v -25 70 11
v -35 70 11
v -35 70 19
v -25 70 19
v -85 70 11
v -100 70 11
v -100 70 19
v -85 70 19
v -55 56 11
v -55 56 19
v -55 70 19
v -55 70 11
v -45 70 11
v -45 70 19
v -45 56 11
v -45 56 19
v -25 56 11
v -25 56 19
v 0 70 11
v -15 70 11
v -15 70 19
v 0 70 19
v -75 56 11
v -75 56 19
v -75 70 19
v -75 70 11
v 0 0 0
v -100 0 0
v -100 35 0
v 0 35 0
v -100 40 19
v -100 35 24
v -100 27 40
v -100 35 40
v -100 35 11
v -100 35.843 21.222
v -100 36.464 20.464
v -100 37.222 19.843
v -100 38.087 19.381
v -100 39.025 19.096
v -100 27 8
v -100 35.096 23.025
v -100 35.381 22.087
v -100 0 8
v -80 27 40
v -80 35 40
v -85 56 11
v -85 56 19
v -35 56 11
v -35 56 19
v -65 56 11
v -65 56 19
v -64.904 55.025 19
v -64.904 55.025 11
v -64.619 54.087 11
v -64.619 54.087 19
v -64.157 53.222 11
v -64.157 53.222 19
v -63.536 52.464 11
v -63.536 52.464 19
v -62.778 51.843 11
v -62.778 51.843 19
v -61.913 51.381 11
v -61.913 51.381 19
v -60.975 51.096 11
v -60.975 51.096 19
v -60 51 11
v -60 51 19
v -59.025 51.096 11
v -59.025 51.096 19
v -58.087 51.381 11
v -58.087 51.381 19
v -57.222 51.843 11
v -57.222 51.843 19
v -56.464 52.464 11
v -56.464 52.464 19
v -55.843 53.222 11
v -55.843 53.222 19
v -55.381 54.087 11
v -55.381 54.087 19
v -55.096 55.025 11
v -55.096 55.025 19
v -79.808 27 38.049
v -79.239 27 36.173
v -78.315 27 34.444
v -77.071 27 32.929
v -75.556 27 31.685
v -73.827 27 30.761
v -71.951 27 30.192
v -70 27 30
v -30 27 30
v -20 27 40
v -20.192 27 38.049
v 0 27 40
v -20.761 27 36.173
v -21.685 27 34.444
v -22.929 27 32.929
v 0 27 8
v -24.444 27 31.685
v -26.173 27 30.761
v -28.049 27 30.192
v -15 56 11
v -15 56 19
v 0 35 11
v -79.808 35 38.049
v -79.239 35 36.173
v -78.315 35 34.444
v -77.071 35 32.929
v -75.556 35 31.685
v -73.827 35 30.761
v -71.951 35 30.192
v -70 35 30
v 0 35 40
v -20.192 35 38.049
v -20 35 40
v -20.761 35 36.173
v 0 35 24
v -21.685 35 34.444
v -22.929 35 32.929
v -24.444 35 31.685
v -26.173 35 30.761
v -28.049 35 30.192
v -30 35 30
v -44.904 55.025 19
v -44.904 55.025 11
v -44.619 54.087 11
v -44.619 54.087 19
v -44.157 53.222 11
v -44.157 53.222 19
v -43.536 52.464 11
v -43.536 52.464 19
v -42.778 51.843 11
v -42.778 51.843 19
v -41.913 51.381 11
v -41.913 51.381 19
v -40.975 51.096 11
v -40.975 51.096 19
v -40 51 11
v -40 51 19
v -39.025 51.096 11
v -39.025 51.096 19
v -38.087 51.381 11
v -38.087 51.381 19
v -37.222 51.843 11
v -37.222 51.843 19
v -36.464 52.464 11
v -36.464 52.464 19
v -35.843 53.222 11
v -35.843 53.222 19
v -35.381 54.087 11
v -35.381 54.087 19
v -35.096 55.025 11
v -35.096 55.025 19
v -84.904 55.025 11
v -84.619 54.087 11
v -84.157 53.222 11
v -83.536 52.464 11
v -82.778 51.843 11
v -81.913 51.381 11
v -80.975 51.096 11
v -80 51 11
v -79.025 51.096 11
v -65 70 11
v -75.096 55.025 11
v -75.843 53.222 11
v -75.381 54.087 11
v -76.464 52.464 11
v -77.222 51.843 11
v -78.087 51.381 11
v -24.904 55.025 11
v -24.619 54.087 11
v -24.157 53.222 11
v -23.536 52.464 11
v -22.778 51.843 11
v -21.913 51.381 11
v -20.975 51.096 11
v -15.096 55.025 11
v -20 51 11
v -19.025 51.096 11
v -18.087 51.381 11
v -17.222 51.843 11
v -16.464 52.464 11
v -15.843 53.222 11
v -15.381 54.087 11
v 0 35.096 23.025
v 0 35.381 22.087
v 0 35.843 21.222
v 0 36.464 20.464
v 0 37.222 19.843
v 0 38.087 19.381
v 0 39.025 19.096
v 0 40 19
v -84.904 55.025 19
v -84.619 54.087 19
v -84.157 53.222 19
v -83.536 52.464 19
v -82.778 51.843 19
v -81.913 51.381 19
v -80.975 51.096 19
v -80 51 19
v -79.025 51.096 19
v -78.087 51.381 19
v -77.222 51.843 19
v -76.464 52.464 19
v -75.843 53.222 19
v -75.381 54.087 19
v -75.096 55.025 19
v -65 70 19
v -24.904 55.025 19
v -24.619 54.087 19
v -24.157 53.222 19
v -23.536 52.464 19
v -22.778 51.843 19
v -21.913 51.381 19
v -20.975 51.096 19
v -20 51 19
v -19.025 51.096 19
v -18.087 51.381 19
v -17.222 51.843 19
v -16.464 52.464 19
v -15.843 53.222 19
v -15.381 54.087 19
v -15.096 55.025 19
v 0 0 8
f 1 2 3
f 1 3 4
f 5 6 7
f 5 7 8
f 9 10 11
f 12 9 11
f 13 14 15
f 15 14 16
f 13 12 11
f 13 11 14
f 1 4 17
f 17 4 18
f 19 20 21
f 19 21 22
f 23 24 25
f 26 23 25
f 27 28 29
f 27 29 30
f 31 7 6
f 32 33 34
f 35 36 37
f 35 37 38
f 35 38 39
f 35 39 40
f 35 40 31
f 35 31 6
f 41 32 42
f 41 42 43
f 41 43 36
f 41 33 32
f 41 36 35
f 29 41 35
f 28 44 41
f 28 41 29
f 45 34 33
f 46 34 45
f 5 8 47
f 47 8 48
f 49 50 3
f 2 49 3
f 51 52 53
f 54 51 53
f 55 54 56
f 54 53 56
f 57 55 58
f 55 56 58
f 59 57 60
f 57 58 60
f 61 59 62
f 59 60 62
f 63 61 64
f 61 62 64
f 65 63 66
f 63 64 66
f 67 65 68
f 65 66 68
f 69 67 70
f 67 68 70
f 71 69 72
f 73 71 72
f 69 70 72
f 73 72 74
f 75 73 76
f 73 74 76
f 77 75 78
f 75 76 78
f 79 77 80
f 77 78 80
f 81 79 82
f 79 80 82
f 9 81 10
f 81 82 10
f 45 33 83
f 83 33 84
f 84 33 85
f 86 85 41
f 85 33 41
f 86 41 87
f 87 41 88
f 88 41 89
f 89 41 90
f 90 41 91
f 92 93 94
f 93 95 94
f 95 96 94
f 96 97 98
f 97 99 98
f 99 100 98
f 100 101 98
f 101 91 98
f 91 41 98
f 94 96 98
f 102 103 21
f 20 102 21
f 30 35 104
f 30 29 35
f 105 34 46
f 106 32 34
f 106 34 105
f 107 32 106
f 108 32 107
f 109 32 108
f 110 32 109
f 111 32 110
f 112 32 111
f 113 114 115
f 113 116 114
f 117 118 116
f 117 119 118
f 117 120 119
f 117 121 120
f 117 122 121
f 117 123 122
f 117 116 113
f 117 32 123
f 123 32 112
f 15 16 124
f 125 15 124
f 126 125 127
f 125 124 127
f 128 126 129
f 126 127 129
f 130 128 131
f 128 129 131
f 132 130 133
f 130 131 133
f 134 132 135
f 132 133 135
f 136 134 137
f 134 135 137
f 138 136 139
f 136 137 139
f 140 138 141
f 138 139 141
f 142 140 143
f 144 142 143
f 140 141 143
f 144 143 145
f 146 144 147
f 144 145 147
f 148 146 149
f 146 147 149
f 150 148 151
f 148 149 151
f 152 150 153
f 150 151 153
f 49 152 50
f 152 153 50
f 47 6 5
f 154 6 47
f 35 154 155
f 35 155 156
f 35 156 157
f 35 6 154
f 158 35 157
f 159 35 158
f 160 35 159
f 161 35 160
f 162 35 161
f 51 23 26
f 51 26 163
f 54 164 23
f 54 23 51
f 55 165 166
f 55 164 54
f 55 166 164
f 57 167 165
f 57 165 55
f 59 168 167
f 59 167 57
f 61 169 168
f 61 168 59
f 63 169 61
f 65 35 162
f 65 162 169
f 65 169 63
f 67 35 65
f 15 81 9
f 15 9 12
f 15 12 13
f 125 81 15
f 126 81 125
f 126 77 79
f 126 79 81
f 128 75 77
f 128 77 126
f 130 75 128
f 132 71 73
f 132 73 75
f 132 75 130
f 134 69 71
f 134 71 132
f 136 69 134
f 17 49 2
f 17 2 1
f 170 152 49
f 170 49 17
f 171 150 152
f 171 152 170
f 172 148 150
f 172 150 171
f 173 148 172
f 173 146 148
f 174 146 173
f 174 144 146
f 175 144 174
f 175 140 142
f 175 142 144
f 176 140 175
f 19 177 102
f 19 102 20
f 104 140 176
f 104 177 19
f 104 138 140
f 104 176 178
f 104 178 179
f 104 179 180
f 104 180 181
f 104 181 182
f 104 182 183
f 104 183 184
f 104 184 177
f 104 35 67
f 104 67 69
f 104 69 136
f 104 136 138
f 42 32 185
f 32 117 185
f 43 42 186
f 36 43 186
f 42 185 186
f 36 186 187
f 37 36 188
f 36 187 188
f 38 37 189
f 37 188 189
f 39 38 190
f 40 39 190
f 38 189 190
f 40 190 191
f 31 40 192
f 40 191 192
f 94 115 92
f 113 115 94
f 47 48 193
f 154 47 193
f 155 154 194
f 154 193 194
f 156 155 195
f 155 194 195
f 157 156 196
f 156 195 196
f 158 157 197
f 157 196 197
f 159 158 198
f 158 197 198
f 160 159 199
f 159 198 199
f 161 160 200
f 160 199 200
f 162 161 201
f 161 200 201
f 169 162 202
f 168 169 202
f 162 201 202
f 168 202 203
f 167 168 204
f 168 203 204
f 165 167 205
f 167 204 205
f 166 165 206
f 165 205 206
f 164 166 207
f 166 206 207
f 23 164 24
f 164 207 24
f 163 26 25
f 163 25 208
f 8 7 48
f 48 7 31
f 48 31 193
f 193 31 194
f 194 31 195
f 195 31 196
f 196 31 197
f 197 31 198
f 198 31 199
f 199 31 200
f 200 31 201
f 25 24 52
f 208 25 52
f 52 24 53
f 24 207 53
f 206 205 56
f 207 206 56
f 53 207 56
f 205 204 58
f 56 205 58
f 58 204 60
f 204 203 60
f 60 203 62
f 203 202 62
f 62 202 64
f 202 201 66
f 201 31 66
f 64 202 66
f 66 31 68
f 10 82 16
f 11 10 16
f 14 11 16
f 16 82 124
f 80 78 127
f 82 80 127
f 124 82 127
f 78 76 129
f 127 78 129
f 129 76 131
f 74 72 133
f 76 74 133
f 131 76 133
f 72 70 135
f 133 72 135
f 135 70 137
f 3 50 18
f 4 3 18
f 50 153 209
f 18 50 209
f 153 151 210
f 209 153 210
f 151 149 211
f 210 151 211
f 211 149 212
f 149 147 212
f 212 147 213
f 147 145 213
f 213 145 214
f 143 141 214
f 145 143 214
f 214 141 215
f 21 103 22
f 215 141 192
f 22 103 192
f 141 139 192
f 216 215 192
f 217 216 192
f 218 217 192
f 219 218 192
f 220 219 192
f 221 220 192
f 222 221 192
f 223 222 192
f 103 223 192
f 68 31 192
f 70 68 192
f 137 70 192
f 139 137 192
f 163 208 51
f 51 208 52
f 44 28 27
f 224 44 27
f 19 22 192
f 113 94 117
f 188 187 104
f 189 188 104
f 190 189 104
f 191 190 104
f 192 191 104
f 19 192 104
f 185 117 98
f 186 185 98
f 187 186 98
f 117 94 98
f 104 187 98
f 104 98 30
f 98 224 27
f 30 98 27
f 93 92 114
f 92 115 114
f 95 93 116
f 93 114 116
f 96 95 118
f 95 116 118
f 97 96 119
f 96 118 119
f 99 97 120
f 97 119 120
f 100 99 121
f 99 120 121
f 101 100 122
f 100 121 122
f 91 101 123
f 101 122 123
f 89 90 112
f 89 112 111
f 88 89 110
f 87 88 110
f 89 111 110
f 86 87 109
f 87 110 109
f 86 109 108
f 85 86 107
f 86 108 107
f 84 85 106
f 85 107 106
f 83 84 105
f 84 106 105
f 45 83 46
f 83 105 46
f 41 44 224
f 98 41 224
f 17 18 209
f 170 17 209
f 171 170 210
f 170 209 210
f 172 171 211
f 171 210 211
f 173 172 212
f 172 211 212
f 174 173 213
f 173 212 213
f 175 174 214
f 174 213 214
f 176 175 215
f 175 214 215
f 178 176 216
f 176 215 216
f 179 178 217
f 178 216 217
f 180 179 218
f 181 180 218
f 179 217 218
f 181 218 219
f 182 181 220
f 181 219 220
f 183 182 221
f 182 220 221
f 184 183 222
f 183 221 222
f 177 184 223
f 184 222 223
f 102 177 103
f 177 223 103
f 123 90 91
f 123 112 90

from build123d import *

# Parameters (mm, degrees)
SKETCH1_W           = 100
SKETCH1_H           = 8
BOSS_EXTRUDE1_DEPTH = 35
SKETCH2_W           = 100
SKETCH2_H           = 8
BOSS_EXTRUDE2_DEPTH = 40
SKETCH6_W           = 60
SKETCH6_H           = 8
CUT_EXTRUDE2_DEPTH  = 10
FILLET1_R           = 10
SKETCH8_W           = 100
SKETCH8_H           = 8
BOSS_EXTRUDE3_DEPTH = 35
CUT_EXTRUDE3_DEPTH  = 8
FILLET2_R           = 5


with BuildPart() as part:
    # Sketch1 → Boss-Extrude1 (new body)
    with BuildSketch(Plane(origin=(0, 0, 0), x_dir=(1, 0, 0), z_dir=(0, 1, 0))):
        with Locations((-50, -4)):
            Rectangle(SKETCH1_W, SKETCH1_H)
    extrude(amount=BOSS_EXTRUDE1_DEPTH)

    # Sketch2 → Boss-Extrude2 (add)
    with BuildSketch(Plane.XY):
        with Locations((-50, 31)):
            Rectangle(SKETCH2_W, SKETCH2_H)
    extrude(amount=BOSS_EXTRUDE2_DEPTH)

    # Sketch6 → Cut-Extrude2 (cut)
    with BuildSketch(Plane.XY.offset(40)):
        with Locations((-50, 31)):
            Rectangle(SKETCH6_W, SKETCH6_H)
    extrude(amount=-CUT_EXTRUDE2_DEPTH, mode=Mode.SUBTRACT)

    # Fillet1
    fillet1_edges = [part.edges().sort_by_distance(p)[0] for p in [
        (-20, 31, 30),
        (-80, 31, 30),
    ]]
    fillet(fillet1_edges, radius=FILLET1_R - 0.0001)  # a hair under: the kernel refuses the full size

    # Sketch8 → Boss-Extrude3 (add)
    with BuildSketch(Plane(origin=(0, 35, 0), x_dir=(1, 0, 0), z_dir=(0, 1, 0))):
        with Locations((-50, -15)):
            Rectangle(SKETCH8_W, SKETCH8_H)
    extrude(amount=BOSS_EXTRUDE3_DEPTH)

    # Sketch9 → Cut-Extrude3 (cut)
    with BuildSketch(Plane.XY.offset(19)):
        with BuildLine():
            Line((-85, 70), (-85, 56))
            ThreePointArc((-85, 56), (-80, 51), (-75, 56))
            Line((-75, 56), (-75, 70))
            Line((-75, 70), (-85, 70))
        make_face()
        with BuildLine():
            Line((-65, 70), (-65, 56))
            ThreePointArc((-65, 56), (-60, 51), (-55, 56))
            Line((-55, 56), (-55, 70))
            Line((-55, 70), (-65, 70))
        make_face()
        with BuildLine():
            Line((-45, 70), (-45, 56))
            ThreePointArc((-45, 56), (-40, 51), (-35, 56))
            Line((-35, 56), (-35, 70))
            Line((-35, 70), (-45, 70))
        make_face()
        with BuildLine():
            Line((-25, 70), (-25, 56))
            ThreePointArc((-25, 56), (-20, 51), (-15, 56))
            Line((-15, 56), (-15, 70))
            Line((-15, 70), (-25, 70))
        make_face()
    extrude(amount=-CUT_EXTRUDE3_DEPTH, mode=Mode.SUBTRACT)

    # Fillet2
    fillet2_edges = [part.edges().sort_by_distance(p)[0] for p in [
        (-50, 35, 19),
    ]]
    fillet(fillet2_edges, radius=FILLET2_R)


solid = part.part
